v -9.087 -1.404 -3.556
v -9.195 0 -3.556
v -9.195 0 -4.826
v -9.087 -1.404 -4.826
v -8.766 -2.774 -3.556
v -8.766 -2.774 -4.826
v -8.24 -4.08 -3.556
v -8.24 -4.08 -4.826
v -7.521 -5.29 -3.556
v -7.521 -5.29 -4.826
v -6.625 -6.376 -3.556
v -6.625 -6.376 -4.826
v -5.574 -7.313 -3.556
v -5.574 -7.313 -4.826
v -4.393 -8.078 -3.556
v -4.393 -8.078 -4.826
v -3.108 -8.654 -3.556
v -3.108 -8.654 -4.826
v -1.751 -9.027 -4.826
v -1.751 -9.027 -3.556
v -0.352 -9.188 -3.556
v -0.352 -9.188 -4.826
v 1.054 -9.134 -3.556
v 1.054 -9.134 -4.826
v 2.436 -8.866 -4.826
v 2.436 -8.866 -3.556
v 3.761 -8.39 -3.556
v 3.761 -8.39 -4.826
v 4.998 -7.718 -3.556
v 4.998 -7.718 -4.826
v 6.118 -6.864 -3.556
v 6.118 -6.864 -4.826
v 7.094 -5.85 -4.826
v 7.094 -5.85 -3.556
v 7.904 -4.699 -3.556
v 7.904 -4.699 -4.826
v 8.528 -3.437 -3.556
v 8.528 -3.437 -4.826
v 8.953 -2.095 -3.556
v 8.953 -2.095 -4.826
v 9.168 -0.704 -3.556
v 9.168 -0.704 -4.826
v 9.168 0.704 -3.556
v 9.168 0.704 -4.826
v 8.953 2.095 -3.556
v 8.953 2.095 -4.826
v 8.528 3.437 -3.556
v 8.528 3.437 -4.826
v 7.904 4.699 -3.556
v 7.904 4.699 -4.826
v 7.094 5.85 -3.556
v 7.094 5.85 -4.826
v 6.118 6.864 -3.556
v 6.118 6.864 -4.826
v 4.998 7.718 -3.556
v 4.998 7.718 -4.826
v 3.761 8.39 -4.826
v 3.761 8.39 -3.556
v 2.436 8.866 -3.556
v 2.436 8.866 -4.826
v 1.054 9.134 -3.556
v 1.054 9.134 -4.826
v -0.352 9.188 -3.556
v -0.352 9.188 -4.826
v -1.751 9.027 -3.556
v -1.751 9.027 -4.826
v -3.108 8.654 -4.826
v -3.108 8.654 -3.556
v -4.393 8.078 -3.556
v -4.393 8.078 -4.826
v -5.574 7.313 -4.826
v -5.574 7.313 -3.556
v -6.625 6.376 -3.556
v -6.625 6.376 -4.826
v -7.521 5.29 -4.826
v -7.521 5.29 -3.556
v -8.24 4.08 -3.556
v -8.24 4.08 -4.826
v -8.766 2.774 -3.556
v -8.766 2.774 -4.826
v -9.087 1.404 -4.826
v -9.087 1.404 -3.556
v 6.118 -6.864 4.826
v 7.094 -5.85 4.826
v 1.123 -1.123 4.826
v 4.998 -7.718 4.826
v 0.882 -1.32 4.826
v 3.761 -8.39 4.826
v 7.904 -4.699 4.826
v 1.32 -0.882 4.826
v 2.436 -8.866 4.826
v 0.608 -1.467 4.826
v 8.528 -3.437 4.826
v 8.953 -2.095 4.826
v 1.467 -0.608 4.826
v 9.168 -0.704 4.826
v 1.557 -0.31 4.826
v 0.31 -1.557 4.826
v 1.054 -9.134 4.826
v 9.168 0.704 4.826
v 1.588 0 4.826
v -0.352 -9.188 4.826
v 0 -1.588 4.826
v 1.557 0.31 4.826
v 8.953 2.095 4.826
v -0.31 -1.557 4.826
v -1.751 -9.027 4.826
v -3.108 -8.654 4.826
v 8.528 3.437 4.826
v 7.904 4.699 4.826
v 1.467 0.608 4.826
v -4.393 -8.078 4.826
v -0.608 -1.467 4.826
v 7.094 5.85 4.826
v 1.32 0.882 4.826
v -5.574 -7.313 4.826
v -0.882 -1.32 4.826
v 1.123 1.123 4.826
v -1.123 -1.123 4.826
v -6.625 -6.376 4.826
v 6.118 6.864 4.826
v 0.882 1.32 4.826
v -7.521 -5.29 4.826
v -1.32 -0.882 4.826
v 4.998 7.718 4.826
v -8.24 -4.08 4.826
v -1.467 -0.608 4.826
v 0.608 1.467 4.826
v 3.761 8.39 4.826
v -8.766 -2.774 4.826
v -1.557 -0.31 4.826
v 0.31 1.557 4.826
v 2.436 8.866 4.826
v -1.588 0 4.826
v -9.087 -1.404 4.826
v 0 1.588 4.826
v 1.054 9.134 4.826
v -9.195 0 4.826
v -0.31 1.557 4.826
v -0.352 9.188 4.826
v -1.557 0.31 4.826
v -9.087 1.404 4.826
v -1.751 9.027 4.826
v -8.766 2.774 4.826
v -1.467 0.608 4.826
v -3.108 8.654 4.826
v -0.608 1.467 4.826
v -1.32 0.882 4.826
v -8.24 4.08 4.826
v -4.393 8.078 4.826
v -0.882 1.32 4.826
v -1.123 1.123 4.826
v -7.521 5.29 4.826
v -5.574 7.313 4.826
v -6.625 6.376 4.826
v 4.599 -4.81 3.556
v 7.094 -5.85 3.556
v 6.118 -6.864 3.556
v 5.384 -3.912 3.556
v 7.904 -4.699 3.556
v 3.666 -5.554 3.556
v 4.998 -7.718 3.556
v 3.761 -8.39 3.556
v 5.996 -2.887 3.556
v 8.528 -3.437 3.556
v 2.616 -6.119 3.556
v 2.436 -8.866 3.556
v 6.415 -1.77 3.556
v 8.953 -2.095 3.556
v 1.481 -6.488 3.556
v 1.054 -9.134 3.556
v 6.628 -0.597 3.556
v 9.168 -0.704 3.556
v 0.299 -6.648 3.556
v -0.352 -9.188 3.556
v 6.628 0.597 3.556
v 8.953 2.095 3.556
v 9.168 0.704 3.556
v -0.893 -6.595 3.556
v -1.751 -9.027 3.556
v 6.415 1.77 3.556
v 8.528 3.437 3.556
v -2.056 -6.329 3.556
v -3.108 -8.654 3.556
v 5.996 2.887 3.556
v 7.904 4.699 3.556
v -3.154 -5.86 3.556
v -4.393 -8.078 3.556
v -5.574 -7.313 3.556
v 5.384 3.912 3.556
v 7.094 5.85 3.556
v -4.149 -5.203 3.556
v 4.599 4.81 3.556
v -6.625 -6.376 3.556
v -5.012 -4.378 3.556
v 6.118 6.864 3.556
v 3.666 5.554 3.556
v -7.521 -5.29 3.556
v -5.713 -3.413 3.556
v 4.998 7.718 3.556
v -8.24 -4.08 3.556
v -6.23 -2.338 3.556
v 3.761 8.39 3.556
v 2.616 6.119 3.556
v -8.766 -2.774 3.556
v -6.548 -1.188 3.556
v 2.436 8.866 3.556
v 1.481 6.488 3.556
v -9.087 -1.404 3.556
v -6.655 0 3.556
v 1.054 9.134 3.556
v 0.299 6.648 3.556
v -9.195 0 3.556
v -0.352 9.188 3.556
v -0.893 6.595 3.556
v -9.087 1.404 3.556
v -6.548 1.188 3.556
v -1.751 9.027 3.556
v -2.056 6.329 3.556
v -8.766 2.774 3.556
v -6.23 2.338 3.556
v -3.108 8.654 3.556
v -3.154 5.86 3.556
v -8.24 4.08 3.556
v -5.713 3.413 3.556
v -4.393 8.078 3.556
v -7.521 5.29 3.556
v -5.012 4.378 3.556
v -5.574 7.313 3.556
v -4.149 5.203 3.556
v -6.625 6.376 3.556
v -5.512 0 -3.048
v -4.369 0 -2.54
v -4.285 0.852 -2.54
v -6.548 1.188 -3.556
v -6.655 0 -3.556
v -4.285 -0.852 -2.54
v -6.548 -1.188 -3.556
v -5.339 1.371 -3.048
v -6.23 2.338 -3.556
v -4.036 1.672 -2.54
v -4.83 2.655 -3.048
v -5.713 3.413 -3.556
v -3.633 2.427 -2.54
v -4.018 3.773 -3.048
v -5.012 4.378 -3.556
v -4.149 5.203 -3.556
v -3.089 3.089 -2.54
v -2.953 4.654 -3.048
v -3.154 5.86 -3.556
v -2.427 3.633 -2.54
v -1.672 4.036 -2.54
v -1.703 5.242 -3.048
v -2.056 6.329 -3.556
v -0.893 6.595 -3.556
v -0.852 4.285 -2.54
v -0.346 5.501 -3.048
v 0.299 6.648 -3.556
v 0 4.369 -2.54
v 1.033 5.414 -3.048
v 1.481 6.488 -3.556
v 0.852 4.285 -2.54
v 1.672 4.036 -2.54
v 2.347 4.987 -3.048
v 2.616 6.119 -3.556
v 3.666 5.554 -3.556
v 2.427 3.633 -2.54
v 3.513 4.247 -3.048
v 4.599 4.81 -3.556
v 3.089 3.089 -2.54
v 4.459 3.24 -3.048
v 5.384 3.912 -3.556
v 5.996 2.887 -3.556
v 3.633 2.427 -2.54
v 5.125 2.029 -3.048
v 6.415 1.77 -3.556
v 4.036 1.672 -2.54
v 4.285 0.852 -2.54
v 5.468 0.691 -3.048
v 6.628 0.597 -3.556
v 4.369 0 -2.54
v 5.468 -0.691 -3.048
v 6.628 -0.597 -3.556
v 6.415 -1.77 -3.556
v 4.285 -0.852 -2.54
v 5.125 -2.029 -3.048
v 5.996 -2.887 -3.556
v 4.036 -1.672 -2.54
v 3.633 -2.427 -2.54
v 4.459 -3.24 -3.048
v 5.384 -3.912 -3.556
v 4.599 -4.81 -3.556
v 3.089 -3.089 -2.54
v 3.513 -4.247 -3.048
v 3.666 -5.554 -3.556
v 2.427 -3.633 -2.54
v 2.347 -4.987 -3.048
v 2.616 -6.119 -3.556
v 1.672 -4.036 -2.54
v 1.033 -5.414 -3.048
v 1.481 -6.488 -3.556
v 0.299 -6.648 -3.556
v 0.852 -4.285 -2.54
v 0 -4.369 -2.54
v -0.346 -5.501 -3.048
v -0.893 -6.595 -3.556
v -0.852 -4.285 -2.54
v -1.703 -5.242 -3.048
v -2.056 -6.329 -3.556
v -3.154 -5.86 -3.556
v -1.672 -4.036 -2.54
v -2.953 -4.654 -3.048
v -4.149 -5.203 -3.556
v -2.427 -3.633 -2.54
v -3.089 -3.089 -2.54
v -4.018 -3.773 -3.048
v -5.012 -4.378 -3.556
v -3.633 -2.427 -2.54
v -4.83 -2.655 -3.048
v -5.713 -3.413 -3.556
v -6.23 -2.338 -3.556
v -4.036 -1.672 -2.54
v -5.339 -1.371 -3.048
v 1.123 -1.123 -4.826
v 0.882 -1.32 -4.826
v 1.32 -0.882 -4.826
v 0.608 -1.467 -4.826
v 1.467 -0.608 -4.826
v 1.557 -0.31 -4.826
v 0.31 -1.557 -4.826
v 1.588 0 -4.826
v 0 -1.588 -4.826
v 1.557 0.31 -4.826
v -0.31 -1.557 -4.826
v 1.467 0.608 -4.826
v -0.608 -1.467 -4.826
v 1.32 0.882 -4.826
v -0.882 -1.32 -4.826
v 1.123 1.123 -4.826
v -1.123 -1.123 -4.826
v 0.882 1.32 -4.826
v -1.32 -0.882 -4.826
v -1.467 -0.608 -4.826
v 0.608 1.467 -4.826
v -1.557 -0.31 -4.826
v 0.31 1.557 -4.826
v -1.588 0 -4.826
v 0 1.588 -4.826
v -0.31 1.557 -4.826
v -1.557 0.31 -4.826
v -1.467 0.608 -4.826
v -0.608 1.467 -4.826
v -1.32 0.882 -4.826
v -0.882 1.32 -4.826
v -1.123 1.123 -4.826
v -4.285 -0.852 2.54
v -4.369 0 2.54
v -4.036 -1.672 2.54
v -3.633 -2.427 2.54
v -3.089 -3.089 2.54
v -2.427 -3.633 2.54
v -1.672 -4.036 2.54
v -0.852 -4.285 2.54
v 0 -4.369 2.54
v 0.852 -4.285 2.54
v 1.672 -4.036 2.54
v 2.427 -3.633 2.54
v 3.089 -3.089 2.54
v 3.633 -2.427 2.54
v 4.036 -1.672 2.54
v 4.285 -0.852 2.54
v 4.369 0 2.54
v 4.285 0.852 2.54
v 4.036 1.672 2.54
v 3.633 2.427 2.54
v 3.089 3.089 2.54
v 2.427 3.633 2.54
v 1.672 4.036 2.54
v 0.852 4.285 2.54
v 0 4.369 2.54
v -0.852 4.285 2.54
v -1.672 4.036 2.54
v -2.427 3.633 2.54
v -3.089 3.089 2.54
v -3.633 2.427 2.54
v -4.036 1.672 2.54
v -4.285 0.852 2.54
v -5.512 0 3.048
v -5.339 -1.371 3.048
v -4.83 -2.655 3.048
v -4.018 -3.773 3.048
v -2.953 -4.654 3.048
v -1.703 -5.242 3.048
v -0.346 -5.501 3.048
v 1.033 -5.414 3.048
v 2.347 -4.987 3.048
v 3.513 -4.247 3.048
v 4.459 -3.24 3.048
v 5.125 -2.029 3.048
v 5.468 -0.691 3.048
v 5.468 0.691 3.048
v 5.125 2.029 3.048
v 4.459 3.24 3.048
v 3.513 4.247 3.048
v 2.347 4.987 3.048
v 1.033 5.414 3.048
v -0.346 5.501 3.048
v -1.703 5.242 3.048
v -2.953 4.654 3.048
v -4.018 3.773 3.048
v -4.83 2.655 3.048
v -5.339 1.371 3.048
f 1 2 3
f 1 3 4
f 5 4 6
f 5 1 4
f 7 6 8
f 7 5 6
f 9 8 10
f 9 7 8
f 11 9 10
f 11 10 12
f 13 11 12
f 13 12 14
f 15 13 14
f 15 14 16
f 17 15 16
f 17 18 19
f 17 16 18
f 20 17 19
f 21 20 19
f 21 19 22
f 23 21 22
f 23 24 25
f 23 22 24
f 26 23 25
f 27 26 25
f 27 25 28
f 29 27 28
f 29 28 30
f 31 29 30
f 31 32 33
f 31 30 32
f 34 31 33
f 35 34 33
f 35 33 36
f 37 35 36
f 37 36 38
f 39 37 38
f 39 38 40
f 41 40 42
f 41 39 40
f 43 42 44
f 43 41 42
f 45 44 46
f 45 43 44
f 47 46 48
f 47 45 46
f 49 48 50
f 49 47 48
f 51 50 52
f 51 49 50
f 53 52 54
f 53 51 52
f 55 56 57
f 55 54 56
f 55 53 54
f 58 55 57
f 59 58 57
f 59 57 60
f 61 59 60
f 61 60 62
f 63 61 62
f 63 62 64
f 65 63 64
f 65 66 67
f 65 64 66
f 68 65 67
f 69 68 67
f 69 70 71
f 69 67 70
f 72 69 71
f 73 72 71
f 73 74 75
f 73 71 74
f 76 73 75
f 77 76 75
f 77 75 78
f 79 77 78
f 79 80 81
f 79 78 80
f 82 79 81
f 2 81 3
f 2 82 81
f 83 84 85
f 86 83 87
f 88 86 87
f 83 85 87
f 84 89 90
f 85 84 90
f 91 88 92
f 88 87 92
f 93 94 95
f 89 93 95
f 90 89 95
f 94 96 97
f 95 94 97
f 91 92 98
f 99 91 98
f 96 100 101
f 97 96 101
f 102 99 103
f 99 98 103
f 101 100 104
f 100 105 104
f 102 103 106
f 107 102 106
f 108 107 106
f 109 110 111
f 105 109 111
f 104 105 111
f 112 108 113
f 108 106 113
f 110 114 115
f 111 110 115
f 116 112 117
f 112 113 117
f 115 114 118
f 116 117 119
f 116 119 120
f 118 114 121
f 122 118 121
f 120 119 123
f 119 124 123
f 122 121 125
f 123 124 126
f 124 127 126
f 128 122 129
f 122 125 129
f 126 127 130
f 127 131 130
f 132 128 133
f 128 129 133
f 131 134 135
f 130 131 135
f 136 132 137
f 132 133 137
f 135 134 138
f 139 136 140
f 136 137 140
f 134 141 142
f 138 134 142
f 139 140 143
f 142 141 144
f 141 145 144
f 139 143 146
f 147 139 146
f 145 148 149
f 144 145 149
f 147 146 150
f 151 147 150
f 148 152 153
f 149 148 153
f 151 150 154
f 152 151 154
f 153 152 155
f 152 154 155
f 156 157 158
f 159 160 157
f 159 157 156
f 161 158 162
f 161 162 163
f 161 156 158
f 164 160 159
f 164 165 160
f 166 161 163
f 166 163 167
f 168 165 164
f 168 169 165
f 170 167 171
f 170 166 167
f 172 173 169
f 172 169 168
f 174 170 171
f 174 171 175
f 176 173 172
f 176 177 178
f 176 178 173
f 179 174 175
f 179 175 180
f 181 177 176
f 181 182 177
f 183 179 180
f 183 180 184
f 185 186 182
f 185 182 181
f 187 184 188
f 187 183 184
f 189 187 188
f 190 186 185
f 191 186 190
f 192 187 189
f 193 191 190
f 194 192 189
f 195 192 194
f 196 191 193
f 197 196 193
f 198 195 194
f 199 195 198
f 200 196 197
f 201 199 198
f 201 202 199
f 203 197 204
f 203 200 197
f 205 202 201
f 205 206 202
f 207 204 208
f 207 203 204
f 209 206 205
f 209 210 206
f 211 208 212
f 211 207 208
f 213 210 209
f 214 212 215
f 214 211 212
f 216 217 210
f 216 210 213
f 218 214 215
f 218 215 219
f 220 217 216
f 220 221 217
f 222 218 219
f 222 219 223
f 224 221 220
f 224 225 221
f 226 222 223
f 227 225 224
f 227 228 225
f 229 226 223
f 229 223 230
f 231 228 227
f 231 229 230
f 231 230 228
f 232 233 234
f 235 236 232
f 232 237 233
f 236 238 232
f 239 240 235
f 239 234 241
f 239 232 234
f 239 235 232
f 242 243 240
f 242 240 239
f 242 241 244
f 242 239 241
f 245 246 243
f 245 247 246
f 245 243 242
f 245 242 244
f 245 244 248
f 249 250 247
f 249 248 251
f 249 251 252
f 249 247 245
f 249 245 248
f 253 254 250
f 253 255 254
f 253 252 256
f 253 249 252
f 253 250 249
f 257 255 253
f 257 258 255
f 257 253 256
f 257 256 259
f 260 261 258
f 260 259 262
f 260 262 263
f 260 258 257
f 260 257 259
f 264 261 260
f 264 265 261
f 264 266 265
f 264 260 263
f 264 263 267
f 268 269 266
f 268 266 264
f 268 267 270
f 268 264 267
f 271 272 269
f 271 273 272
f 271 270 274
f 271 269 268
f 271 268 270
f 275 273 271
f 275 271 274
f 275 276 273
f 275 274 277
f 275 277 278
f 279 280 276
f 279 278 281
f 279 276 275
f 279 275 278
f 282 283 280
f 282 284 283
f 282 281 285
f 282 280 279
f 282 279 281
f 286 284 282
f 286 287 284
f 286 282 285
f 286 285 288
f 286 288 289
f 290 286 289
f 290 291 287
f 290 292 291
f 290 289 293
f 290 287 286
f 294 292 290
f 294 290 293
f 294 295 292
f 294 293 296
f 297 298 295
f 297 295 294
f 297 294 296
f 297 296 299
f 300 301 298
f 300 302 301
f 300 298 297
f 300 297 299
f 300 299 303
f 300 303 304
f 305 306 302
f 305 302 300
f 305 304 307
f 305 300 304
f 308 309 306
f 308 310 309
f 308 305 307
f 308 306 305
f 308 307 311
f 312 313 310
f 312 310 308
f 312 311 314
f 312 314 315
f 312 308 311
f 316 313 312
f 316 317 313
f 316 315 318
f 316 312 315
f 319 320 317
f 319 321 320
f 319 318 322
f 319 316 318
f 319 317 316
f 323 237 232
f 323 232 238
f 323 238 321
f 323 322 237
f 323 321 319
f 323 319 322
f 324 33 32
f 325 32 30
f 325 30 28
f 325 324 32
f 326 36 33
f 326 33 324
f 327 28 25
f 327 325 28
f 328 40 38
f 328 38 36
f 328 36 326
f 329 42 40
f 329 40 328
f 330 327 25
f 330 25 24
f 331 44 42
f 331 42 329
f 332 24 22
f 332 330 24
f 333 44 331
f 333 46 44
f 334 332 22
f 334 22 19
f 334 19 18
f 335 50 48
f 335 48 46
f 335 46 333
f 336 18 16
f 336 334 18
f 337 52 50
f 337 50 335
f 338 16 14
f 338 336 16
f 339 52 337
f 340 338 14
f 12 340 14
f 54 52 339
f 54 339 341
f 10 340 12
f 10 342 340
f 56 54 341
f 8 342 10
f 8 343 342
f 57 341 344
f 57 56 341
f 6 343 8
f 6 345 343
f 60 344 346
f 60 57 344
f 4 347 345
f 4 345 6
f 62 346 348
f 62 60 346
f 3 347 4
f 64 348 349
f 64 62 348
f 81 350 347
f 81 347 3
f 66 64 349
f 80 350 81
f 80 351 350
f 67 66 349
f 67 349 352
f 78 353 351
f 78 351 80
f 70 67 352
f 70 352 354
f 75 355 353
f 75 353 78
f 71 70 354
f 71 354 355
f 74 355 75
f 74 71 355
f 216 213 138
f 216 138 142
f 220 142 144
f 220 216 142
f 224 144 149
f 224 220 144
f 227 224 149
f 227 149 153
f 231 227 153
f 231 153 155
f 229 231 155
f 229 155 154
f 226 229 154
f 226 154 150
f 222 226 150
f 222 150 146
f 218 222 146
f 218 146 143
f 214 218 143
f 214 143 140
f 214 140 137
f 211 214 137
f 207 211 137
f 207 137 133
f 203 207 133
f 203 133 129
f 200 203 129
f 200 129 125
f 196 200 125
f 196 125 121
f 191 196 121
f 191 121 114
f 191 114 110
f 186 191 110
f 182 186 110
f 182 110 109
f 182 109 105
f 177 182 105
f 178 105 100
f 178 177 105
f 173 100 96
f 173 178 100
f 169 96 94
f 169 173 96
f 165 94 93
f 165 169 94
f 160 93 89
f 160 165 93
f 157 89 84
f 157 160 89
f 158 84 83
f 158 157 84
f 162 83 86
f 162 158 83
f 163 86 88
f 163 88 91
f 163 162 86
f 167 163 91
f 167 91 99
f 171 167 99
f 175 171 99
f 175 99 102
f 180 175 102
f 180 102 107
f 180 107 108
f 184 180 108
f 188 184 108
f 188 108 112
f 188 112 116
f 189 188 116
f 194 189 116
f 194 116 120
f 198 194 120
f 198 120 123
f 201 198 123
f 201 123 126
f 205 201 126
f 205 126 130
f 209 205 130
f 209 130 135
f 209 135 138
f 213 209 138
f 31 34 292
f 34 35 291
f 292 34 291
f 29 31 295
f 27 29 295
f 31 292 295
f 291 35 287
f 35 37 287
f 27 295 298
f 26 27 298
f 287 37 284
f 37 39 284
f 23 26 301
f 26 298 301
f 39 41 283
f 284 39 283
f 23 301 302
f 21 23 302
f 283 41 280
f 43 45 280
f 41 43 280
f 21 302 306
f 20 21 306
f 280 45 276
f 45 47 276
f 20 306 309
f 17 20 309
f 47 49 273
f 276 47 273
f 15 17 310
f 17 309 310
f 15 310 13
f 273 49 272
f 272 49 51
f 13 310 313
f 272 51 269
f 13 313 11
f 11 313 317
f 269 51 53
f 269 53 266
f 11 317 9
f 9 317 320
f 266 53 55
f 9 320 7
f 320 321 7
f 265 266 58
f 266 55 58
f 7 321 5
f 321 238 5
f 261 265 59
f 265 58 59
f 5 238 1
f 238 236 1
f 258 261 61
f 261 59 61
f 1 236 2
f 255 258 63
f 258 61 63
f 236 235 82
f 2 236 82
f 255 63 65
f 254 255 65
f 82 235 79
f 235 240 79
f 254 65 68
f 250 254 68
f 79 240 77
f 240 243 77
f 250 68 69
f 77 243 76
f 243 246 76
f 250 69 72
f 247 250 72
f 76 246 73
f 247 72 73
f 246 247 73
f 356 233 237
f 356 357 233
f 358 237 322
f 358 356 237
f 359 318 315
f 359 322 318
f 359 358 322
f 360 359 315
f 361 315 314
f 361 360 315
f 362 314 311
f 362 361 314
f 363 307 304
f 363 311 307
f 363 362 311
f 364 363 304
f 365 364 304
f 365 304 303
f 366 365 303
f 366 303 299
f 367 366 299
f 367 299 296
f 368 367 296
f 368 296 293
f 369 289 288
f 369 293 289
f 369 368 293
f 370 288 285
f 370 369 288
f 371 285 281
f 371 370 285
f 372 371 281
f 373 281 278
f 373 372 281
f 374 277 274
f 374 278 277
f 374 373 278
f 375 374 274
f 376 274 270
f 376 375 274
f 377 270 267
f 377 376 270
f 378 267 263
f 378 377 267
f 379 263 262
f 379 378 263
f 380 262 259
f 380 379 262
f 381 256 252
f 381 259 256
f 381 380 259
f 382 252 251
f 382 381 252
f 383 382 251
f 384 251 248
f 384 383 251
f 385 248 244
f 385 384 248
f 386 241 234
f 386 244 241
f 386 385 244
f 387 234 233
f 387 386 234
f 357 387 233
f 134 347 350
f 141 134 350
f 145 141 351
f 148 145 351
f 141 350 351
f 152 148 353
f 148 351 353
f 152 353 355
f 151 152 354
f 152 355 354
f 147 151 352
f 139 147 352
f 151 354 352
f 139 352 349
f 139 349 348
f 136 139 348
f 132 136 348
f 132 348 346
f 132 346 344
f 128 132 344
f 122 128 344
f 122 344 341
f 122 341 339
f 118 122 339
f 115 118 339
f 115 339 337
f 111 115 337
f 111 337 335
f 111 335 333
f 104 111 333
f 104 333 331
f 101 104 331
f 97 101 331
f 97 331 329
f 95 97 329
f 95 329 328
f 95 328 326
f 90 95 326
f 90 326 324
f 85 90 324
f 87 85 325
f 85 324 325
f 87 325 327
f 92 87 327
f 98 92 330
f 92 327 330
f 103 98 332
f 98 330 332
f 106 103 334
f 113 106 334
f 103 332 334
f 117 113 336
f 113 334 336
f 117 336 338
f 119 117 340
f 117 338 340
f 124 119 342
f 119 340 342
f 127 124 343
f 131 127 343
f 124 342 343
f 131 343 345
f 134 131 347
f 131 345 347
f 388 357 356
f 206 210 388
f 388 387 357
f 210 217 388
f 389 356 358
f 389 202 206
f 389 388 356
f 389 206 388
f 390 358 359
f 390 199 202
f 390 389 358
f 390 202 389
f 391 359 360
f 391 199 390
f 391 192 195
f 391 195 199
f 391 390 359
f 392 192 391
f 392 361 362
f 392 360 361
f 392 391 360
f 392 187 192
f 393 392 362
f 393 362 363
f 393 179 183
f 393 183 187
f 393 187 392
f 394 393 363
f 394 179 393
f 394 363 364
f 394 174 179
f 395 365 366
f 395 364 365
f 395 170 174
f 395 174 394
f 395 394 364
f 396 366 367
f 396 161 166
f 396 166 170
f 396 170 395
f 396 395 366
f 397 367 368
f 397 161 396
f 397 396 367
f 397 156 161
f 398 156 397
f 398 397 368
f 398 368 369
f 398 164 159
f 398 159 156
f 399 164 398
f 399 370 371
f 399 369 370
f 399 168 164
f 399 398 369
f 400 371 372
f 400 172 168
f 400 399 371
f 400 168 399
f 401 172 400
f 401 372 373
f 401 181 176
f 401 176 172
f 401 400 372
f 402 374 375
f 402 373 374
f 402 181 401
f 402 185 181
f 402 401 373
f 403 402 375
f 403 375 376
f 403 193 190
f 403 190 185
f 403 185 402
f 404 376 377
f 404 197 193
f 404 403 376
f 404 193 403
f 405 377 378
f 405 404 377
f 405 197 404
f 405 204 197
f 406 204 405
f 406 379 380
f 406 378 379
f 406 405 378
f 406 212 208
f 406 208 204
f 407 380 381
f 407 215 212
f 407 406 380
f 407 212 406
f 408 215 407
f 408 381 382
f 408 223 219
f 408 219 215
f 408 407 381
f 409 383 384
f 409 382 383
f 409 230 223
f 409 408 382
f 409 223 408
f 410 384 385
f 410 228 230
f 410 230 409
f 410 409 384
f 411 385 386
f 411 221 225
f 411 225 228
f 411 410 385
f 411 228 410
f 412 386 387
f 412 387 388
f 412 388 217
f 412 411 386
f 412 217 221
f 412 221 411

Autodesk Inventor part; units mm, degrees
ref_plane "YZ Plane" through (0, 0, 0) normal (1, 0, 0) x (0, 1, 0)
ref_plane "XZ Plane" through (0, 0, 0) normal (0, 1, 0) x (-1, 0, 0)
ref_plane "XY Plane" through (0, 0, 0) normal (0, 0, 1) x (1, 0, 0)
sketch "Sketch1" plane through (0, 0, 0) normal (0, 1, 0) x (-1, 0, 0)
  line L0 (0, 0) -> (0, -4.826)
  line L1 (0, -4.826) -> (0, 0)
  line L2 (0, 0) -> (0, 4.826)
  line L3 (0, 4.826) -> (9.1948, 4.826)
  line L4 (9.1948, -4.826) -> (0, -4.826)
  line L5 (9.1948, 4.826) -> (9.1948, 3.556)
  line L6 (9.1948, 3.556) -> (6.6548, 3.556)
  line L7 (9.1948, -4.826) -> (9.1948, -3.556)
  line L8 (9.1948, -3.556) -> (6.6548, -3.556)
  line L9 (9.1948, 4.826) -> (9.1948, 3.556)
  line L10 (9.1948, -3.556) -> (9.1948, -4.826)
  line L11 (9.1948, 0) -> (6.0198, 0)
  line L12 (5.6388, 0) -> (4.3688, 0)
  line L13 (4.3688, 0) -> (4.3688, -2.54)
  line L14 (4.3688, -2.54) -> (4.3688, 0)
  line L15 (4.3688, 0) -> (4.3688, 2.54)
  line L16 (4.3688, 2.54) -> (6.6548, 3.556)
  line L17 (4.3688, -2.54) -> (6.6548, -3.556)
  dimension "d0" = 4.826
  dimension "d1" = 4.826
  dimension "d2" = 9.1948
  dimension "d3" = 1.27
  dimension "d4" = 2.54
  dimension "d5" = 1.27
  dimension "d6" = 2.54
  dimension "d7" = 3.175
  dimension "d9" = 1.27
  dimension "d10" = 2.54
  dimension "d11" = 2.54
  dimension "d12" = 2.54
revolve "Revolution1" add sketch "Sketch1" angle 360 about axis through (0, 0, 0) along (0, 0, -1)
sketch "Sketch2" plane through (0, 0, -4.826) normal (0, 0, -1) x (-1, 0, 0)
  circle A0 centre (0, 0) radius 1.5875
  dimension "d14" = 3.175
extrude "Extrusion1" cut sketch "Sketch2" against normal through all
properties part number "updated_wheel"
